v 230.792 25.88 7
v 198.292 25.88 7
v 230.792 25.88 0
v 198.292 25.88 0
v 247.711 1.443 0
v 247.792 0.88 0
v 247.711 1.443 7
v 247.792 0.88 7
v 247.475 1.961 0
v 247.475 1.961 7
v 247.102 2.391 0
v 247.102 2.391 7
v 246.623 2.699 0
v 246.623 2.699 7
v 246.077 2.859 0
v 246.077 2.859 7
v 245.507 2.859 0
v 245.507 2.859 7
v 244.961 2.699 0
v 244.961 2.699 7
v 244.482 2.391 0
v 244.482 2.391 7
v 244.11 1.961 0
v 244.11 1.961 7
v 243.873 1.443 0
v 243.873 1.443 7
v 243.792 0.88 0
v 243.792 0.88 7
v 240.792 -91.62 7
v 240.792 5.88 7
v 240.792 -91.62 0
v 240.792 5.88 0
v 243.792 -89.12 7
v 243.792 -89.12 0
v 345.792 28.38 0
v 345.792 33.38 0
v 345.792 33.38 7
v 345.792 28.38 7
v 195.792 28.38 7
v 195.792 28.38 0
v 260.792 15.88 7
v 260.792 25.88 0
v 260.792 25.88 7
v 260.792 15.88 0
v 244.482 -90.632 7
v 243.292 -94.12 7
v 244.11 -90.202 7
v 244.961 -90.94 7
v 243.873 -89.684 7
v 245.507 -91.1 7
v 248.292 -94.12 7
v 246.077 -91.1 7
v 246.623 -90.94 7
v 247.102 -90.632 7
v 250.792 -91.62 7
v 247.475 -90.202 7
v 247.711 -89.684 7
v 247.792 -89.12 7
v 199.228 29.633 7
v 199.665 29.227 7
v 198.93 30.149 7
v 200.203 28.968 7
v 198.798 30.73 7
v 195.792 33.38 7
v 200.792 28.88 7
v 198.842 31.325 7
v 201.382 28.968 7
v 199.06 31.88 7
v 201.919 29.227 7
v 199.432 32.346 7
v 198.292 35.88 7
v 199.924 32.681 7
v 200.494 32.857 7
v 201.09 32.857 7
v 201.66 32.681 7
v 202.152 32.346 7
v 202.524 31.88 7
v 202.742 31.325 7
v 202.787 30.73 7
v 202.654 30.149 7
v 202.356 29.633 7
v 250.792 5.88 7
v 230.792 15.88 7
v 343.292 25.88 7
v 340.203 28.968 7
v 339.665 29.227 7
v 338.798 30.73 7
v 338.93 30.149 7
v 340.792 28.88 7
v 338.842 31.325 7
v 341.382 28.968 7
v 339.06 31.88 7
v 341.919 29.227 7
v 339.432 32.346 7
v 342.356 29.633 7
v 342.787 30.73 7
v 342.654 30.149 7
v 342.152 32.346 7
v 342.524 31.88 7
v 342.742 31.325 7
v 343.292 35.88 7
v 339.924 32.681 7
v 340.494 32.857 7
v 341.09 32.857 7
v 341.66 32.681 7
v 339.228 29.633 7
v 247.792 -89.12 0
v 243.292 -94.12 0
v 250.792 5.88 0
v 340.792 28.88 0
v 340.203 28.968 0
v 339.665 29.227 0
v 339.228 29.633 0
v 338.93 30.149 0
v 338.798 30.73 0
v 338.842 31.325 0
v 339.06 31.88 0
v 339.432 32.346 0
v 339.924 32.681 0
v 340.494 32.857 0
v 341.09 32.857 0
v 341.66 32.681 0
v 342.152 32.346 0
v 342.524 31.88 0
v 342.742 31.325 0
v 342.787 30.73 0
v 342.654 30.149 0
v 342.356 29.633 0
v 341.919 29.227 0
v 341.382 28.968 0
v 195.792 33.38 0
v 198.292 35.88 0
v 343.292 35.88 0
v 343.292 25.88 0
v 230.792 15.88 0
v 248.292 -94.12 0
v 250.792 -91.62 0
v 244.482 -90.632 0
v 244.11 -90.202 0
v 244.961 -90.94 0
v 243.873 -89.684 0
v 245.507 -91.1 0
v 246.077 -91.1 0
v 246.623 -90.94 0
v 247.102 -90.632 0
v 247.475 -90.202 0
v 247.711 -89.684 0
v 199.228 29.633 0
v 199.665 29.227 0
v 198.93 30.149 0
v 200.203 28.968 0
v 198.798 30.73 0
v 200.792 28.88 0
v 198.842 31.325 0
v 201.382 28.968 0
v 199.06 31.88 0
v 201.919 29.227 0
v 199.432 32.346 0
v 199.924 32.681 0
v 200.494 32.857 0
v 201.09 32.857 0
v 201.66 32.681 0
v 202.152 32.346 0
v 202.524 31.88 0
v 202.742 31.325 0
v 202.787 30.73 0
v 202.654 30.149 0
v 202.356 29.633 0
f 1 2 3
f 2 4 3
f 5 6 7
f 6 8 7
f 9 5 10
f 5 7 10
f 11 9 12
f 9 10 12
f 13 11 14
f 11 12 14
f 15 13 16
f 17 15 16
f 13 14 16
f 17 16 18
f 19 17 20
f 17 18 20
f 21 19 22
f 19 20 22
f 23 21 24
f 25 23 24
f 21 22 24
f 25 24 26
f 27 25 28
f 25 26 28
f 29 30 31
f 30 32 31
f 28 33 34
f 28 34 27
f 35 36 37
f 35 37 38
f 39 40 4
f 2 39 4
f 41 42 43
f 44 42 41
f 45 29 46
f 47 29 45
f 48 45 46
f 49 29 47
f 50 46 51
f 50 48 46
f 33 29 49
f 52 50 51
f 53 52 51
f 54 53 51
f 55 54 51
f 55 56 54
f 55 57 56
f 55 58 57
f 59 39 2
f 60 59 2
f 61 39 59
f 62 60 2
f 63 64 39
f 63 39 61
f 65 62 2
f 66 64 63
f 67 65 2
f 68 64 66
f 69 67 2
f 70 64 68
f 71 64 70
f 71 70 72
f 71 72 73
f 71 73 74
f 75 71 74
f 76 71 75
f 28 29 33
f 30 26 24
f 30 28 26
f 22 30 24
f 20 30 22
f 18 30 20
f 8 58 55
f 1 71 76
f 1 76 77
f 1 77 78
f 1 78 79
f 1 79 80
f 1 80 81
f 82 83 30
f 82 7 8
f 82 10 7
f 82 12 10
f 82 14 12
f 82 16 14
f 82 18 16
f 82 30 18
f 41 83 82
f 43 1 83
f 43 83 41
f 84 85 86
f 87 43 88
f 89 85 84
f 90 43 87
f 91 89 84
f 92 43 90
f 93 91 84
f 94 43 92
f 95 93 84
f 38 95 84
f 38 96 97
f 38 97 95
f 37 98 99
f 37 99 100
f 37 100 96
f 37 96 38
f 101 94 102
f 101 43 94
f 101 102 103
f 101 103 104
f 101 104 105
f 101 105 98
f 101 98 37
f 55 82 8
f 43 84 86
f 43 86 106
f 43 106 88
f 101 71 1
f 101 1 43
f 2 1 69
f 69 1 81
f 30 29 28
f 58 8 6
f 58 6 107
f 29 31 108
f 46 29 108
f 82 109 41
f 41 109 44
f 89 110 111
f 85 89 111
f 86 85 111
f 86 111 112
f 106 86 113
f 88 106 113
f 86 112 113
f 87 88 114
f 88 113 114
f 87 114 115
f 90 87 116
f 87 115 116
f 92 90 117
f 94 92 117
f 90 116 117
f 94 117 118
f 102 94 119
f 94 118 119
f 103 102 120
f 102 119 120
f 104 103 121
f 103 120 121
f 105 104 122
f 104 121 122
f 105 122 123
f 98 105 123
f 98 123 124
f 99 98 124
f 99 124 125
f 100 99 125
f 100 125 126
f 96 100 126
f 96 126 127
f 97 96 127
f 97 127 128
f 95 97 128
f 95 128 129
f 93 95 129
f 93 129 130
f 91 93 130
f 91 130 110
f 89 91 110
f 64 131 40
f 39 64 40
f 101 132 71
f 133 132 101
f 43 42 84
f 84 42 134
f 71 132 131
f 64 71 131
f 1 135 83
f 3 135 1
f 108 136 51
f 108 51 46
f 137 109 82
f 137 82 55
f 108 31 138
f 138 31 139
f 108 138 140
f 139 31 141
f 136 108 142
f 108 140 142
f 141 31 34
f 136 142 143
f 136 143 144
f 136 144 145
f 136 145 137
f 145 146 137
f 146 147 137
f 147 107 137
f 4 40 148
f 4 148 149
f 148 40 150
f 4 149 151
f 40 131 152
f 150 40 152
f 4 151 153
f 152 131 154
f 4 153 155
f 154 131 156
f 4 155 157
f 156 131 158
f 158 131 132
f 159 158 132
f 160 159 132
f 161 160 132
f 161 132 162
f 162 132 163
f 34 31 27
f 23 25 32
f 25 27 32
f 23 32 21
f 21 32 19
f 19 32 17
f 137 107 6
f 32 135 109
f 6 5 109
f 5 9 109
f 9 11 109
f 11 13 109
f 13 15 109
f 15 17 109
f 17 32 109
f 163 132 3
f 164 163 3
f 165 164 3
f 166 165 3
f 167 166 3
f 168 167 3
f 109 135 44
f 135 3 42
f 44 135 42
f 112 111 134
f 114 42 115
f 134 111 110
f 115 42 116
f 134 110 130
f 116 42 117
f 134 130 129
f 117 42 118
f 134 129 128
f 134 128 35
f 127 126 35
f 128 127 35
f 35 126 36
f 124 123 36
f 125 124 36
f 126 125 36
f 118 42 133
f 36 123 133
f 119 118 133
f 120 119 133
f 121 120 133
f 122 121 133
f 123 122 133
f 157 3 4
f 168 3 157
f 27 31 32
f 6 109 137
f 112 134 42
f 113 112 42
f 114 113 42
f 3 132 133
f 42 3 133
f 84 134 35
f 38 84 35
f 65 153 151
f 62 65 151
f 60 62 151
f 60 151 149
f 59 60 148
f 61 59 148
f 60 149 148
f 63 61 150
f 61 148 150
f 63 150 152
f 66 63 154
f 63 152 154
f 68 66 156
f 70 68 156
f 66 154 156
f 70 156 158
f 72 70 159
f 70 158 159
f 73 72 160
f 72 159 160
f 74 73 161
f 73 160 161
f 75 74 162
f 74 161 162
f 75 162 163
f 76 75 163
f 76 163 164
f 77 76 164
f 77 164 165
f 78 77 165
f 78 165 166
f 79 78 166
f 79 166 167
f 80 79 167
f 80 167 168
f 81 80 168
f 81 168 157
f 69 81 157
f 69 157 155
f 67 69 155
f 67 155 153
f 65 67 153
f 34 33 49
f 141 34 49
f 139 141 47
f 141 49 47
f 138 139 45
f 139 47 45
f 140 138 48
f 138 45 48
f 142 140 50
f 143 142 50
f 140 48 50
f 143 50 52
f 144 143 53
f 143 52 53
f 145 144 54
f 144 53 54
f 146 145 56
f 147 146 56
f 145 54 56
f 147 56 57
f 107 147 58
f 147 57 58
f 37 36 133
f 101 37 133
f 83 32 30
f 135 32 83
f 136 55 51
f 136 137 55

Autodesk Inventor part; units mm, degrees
ref_plane "YZ Plane" through (0, 0, 0) normal (1, 0, 0) x (0, 1, 0)
ref_plane "XZ Plane" through (0, 0, 0) normal (0, 1, 0) x (-1, 0, 0)
ref_plane "XY Plane" through (0, 0, 0) normal (0, 0, 1) x (1, 0, 0)
sketch "Sketch1" plane through (0, 0, 0) normal (0, 0, 1) x (1, 0, 0)
  line L0 (-11.8764, 47.9805) -> (133.1236, 47.9805) projected
  line L1 (133.1236, 47.9805) -> (135.6236, 50.4805) projected
  line L2 (135.6236, 50.4805) -> (135.6236, 55.4805) projected
  line L3 (135.6236, 55.4805) -> (133.1236, 57.9805) projected
  line L4 (133.1236, 57.9805) -> (75.6236, 57.9805) projected
  line L5 (-11.8764, 57.9805) -> (-14.3764, 55.4805) projected
  line L6 (-14.3764, 55.4805) -> (-14.3764, 50.4805) projected
  line L7 (-14.3764, 50.4805) -> (-11.8764, 47.9805) projected
  line L8 (75.6236, 57.9805) -> (75.6236, 67.9805) projected
  line L9 (75.6236, 67.9805) -> (65.6236, 77.9805) projected
  line L10 (65.6236, 77.9805) -> (55.6236, 77.9805) projected
  line L11 (55.6236, 77.9805) -> (45.6236, 67.9805) projected
  line L12 (45.6236, 67.9805) -> (45.6236, 57.9805) projected
  line L13 (45.6236, 57.9805) -> (-11.8764, 57.9805) projected
  circle A0 centre (-9.3764, 52.9805) radius 2 projected
  circle A1 centre (130.6236, 52.9805) radius 2 projected
  line L14 (200.7921, 30.8795) -> (340.7921, 30.8795) construction
  line L15 (245.7921, 30.8795) -> (245.7921, -89.1205) construction
  line L16 (198.2921, 35.8795) -> (343.2921, 35.8795)
  line L17 (240.7921, 5.8795) -> (240.7921, -91.6205)
  line L18 (250.7921, 5.8795) -> (250.7921, -91.6205)
  line L19 (248.2921, -94.1205) -> (243.2921, -94.1205)
  line L20 (195.7921, 33.3795) -> (195.7921, 28.3795)
  line L21 (345.7921, 33.3795) -> (345.7921, 28.3795)
  line L22 (240.7921, -91.6205) -> (243.2921, -94.1205)
  line L23 (250.7921, -91.6205) -> (248.2921, -94.1205)
  line L24 (343.2921, 25.8795) -> (345.7921, 28.3795)
  line L25 (345.7921, 33.3795) -> (343.2921, 35.8795)
  line L26 (198.2921, 35.8795) -> (195.7921, 33.3795)
  line L27 (195.7921, 28.3795) -> (198.2921, 25.8795)
  line L28 (198.2921, 25.8795) -> (230.7921, 25.8795)
  line L29 (260.7921, 25.8795) -> (343.2921, 25.8795)
  line L30 (260.7921, 25.8795) -> (260.7921, 15.8795)
  line L31 (230.7921, 15.8795) -> (230.7921, 25.8795)
  line L32 (250.7921, 5.8795) -> (260.7921, 15.8795)
  line L33 (240.7921, 5.8795) -> (230.7921, 15.8795)
  point P0 (195.7921, 35.8795)
  point P1 (345.7921, 35.8795)
  point P2 (195.7921, 25.8795)
  point P3 (345.7921, 25.8795)
  point P4 (240.7921, -94.1205)
  point P5 (250.7921, -94.1205)
  point P6 (260.7921, 5.8795)
  point P7 (230.7921, 5.8795)
  dimension "d54" = 140
  dimension "d55" = 120
  dimension "d56" = 45
  dimension "d57" = 5
  dimension "d59" = 5
  dimension "d60" = 5
  dimension "d61" = 5
  dimension "d62" = 5
  dimension "d63" = 5
  dimension "d64" = 2.5
  dimension "d65" = 2.5
  dimension "d66" = 2.5
  dimension "d67" = 2.5
  dimension "d68" = 2.5
  dimension "d69" = 2.5
  dimension "d70" = 2.5
  dimension "d71" = 2.5
  dimension "d72" = 2.5
  dimension "d73" = 2.5
  dimension "d74" = 2.5
  dimension "d75" = 2.5
  dimension "d76" = 30
  dimension "d77" = 20
  dimension "d78" = 15
  dimension "d79" = 10
  dimension "d80" = 10
  dimension "d81" = 10
  dimension "d82" = 10
extrude "Extrusion1" add sketch "Sketch1" along normal blind 7 contours L16 L25 L21 L24 L29 L30 L32 L18 L23 L19 L22 L17 L33 L31 L28 L27 L20 L26
sketch "Sketch2" plane through (0, 0, 7) normal (0, 0, 1) x (1, 0, 0)
  line L0 (195.7921, 33.3795) -> (195.7921, 28.3795) projected
  line L1 (345.7921, 28.3795) -> (345.7921, 33.3795) projected
  point P0 (200.7921, 30.8795)
  point P1 (340.7921, 30.8795)
  dimension "d83" = 5
  dimension "d84" = 5
hole "Hole1" at (200.7921, 30.8795, 7) at (340.7921, 30.8795, 7) direction (0, 0, -1) diameter 4 end through all
sketch "Sketch4" plane through (0, 0, 7) normal (0, 0, 1) x (1, 0, 0)
  circle A0 centre (200.7921, 30.8795) radius 2 construction
  circle A1 centre (340.7921, 30.8795) radius 2 construction
  line L0 (200.7921, 30.8795) -> (340.7921, 30.8795) construction
  line L1 (245.7921, -89.1205) -> (245.7921, 30.8795) construction
  line L2 (243.2921, -94.1205) -> (248.2921, -94.1205) construction
  line L3 (243.7921, -89.1205) -> (243.7921, 0.8795)
  line L4 (247.7921, 0.8795) -> (247.7921, -89.1205)
  arc A2 (247.7921, 0.8795) -> (243.7921, 0.8795) centre (245.7921, 0.8795) ccw
  arc A3 (243.7921, -89.1205) -> (247.7921, -89.1205) centre (245.7921, -89.1205) ccw
  point P0 (0, 0)
  point P1 (245.7921, -94.1205)
  dimension "d89" = 2
  dimension "d90" = 45
  dimension "d92" = 5
  dimension "d93" = 2
extrude "Extrusion3" cut sketch "Sketch4" against normal blind 7
equation "\"d65\" = d64"
equation "\"d66\" = d64"
equation "\"d67\" = d66"
equation "\"d68\" = d64"
equation "\"d69\" = d68"
equation "\"d70\" = d64"
equation "\"d71\" = d70"
equation "\"d72\" = d64"
equation "\"d73\" = d72"
equation "\"d74\" = d64"
equation "\"d75\" = d74"
equation "\"d80\" = d79"
equation "\"d81\" = d79"
equation "\"d82\" = d81"
properties part number "tLever" material "MDF Medium Density Fiberboard"
